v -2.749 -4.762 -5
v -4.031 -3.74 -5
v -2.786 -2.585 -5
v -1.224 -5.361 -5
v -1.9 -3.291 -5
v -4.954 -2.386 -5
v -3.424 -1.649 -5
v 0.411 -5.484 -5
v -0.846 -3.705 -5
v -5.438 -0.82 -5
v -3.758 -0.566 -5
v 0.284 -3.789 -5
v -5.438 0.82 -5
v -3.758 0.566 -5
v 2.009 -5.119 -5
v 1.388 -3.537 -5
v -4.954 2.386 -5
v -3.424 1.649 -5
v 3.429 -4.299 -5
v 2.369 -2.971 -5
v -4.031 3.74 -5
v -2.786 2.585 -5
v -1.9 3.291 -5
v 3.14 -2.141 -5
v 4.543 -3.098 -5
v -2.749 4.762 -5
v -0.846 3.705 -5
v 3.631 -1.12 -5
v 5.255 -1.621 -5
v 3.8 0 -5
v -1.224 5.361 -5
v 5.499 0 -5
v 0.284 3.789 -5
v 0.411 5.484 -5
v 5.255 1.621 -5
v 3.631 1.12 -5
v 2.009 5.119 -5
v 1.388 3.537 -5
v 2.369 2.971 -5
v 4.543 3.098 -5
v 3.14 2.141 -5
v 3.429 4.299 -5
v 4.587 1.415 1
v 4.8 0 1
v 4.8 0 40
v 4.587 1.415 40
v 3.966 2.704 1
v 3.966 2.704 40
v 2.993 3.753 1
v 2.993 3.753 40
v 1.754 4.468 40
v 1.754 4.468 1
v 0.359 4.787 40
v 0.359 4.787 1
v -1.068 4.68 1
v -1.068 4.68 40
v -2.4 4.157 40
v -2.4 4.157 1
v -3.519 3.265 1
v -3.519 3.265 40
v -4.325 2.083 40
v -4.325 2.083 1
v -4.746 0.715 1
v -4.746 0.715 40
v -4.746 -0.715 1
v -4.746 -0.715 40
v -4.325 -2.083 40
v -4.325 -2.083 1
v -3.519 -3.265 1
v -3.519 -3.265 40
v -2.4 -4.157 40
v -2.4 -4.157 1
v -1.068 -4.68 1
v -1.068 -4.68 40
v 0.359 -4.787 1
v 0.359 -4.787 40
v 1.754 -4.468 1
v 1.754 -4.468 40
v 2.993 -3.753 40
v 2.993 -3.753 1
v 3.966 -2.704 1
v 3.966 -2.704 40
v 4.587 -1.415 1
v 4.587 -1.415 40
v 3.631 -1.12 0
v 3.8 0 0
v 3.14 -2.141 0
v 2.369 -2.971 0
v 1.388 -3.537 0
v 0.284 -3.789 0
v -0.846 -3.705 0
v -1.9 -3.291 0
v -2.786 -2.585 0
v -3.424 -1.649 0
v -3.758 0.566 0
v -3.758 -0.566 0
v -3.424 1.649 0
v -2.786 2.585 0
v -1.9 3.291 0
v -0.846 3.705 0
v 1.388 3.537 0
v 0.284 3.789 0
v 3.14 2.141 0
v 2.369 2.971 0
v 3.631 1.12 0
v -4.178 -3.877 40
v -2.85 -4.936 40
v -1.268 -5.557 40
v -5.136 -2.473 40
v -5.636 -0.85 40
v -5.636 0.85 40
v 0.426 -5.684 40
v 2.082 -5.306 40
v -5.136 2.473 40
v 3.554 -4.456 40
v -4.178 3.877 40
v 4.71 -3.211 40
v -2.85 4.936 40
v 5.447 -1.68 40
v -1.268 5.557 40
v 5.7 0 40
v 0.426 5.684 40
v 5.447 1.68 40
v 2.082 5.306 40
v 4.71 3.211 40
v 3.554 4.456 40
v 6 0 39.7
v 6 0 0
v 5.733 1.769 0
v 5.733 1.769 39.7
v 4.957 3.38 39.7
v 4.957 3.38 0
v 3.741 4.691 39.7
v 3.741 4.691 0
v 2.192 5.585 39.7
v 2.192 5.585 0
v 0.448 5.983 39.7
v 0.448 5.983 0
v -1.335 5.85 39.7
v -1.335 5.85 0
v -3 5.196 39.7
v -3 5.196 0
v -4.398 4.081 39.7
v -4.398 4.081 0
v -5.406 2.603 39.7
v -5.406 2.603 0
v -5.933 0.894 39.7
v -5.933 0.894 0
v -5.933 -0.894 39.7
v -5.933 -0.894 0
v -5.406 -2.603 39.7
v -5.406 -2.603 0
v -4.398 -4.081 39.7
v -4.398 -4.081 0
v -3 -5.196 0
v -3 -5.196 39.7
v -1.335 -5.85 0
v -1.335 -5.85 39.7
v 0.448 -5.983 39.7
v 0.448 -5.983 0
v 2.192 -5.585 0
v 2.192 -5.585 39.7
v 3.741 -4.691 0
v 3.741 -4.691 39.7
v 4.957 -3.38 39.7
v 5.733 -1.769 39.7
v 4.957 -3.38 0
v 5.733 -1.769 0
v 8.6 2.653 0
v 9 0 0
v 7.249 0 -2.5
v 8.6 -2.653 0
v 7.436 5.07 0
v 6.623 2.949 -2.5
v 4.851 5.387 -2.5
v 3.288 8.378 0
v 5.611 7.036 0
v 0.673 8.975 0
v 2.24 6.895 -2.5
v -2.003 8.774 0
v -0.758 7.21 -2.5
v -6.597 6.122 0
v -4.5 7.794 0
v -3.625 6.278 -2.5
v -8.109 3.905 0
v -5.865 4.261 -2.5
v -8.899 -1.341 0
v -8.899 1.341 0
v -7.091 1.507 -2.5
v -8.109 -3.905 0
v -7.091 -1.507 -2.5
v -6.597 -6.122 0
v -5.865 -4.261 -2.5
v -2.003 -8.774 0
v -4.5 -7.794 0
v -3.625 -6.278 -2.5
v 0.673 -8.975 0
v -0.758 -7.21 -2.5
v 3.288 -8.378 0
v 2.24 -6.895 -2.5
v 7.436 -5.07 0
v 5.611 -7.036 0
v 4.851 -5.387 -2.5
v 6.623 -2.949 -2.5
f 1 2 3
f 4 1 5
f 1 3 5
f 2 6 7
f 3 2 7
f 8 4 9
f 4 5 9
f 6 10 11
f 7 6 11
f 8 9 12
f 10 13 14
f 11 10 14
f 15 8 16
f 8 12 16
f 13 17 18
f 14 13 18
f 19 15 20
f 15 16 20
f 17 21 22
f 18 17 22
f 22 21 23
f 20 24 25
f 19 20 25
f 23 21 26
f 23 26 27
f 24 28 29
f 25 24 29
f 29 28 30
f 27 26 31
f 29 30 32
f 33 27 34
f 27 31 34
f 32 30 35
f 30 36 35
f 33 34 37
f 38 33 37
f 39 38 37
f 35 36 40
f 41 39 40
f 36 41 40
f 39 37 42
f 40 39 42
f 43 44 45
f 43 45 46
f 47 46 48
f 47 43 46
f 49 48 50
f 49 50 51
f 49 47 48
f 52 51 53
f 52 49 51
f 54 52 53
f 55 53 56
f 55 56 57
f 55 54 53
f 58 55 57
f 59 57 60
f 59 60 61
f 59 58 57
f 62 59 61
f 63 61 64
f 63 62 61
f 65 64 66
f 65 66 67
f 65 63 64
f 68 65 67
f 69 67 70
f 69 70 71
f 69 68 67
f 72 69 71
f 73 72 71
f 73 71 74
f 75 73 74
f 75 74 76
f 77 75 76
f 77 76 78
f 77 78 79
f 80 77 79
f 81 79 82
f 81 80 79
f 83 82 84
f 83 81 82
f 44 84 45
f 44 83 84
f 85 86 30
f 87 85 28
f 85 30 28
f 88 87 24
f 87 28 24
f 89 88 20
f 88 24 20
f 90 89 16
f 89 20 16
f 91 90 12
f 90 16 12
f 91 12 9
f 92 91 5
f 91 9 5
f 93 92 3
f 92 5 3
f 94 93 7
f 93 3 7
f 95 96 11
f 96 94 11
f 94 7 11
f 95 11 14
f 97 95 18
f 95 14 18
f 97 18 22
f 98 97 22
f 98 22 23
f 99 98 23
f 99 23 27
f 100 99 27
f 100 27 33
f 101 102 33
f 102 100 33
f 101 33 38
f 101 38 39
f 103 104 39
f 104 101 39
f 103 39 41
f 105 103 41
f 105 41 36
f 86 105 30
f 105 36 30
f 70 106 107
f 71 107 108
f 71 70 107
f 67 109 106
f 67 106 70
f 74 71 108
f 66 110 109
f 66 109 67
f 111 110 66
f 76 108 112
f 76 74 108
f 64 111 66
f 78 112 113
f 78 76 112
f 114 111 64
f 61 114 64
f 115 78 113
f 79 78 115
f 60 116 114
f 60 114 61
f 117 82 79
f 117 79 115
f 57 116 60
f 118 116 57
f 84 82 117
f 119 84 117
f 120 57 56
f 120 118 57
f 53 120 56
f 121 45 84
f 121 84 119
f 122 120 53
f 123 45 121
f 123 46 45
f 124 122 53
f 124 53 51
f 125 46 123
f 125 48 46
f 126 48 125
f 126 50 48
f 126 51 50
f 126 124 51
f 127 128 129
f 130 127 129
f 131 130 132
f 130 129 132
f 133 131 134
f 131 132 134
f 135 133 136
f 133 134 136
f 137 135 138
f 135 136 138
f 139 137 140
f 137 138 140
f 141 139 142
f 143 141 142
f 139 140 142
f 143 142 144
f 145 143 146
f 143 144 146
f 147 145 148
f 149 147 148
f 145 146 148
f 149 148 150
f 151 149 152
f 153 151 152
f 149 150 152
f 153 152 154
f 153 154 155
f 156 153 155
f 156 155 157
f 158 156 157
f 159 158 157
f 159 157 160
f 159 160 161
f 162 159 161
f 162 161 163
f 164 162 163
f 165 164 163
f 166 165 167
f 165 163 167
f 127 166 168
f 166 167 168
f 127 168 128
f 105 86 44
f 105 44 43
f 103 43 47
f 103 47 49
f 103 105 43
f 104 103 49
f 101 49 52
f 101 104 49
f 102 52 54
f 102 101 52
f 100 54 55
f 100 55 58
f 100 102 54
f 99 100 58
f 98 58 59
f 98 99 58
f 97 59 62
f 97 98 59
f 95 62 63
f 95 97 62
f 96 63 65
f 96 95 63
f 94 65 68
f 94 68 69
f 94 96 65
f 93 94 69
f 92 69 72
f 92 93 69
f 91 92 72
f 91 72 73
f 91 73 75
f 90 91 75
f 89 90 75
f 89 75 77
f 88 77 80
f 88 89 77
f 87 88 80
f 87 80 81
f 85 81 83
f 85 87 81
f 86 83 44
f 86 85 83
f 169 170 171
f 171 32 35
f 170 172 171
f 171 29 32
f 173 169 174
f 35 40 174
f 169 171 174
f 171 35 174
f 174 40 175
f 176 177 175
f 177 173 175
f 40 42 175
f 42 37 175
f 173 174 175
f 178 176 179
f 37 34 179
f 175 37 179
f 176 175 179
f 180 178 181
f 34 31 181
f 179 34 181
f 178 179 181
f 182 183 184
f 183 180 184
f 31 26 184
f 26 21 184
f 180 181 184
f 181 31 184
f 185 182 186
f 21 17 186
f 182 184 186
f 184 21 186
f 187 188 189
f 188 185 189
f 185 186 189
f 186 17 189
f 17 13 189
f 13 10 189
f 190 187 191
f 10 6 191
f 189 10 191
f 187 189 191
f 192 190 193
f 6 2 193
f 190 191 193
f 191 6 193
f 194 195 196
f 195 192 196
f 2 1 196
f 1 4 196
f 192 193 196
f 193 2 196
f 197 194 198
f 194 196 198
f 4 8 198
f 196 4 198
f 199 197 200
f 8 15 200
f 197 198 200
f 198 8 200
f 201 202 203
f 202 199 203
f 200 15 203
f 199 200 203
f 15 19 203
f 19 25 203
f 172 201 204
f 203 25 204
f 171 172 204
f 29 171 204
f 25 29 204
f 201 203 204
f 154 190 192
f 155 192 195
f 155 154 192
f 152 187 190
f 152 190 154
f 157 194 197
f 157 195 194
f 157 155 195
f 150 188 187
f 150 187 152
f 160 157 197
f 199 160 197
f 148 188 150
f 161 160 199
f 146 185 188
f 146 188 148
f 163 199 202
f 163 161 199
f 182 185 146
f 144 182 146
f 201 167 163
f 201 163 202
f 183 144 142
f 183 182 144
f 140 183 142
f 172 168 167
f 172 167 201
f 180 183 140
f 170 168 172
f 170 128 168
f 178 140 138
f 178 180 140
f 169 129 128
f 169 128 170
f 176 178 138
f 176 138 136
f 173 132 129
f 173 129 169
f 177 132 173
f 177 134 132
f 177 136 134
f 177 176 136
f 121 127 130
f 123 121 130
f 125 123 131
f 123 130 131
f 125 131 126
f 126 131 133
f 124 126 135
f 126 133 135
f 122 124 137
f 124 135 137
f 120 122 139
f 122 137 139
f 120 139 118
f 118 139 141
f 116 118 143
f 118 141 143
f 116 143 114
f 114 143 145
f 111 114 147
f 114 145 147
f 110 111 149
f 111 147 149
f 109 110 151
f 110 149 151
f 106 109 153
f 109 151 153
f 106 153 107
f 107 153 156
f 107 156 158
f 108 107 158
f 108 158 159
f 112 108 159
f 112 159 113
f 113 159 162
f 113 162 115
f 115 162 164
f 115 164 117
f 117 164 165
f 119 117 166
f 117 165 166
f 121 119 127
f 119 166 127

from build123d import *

# Parameters (mm, degrees)
F0_R     = 6
F0_R_2   = 4.8
F1_DEPTH = 40
F2_R     = 9
F3_DEPTH = 5
F3_TAPER = 35
F4_SIZE  = 1
F5_SIZE  = 0.3
F6_R     = 3.8
F7_DEPTH = 100


with BuildPart() as f1:
    # F0 (on Top) → F1 (new body)
    with BuildSketch(Plane.XY):
        Circle(F0_R)
        Circle(F0_R_2, mode=Mode.SUBTRACT)
    extrude(amount=F1_DEPTH)

    # F2 (on Top) → F3 (join)
    with BuildSketch(Plane.XY):
        Circle(F2_R)
    extrude(amount=-F3_DEPTH, taper=F3_TAPER)

    # F4
    f4_edges = [f1.edges().sort_by_distance(p)[0] for p in [
        (-4.8, 0, 0),
    ]]
    chamfer(f4_edges, length=F4_SIZE)

    # F5
    f5_edges = [f1.edges().sort_by_distance(p)[0] for p in [
        (-6, 0, 40),
    ]]
    chamfer(f5_edges, length=F5_SIZE)

    # F6 (on face) → F7 (cut)
    with BuildSketch(Plane(origin=(0, 0, -5), x_dir=(1, 0, 0), z_dir=(0, 0, -1))):
        Circle(F6_R)
    extrude(amount=-F7_DEPTH, mode=Mode.SUBTRACT)


solid = f1.part
